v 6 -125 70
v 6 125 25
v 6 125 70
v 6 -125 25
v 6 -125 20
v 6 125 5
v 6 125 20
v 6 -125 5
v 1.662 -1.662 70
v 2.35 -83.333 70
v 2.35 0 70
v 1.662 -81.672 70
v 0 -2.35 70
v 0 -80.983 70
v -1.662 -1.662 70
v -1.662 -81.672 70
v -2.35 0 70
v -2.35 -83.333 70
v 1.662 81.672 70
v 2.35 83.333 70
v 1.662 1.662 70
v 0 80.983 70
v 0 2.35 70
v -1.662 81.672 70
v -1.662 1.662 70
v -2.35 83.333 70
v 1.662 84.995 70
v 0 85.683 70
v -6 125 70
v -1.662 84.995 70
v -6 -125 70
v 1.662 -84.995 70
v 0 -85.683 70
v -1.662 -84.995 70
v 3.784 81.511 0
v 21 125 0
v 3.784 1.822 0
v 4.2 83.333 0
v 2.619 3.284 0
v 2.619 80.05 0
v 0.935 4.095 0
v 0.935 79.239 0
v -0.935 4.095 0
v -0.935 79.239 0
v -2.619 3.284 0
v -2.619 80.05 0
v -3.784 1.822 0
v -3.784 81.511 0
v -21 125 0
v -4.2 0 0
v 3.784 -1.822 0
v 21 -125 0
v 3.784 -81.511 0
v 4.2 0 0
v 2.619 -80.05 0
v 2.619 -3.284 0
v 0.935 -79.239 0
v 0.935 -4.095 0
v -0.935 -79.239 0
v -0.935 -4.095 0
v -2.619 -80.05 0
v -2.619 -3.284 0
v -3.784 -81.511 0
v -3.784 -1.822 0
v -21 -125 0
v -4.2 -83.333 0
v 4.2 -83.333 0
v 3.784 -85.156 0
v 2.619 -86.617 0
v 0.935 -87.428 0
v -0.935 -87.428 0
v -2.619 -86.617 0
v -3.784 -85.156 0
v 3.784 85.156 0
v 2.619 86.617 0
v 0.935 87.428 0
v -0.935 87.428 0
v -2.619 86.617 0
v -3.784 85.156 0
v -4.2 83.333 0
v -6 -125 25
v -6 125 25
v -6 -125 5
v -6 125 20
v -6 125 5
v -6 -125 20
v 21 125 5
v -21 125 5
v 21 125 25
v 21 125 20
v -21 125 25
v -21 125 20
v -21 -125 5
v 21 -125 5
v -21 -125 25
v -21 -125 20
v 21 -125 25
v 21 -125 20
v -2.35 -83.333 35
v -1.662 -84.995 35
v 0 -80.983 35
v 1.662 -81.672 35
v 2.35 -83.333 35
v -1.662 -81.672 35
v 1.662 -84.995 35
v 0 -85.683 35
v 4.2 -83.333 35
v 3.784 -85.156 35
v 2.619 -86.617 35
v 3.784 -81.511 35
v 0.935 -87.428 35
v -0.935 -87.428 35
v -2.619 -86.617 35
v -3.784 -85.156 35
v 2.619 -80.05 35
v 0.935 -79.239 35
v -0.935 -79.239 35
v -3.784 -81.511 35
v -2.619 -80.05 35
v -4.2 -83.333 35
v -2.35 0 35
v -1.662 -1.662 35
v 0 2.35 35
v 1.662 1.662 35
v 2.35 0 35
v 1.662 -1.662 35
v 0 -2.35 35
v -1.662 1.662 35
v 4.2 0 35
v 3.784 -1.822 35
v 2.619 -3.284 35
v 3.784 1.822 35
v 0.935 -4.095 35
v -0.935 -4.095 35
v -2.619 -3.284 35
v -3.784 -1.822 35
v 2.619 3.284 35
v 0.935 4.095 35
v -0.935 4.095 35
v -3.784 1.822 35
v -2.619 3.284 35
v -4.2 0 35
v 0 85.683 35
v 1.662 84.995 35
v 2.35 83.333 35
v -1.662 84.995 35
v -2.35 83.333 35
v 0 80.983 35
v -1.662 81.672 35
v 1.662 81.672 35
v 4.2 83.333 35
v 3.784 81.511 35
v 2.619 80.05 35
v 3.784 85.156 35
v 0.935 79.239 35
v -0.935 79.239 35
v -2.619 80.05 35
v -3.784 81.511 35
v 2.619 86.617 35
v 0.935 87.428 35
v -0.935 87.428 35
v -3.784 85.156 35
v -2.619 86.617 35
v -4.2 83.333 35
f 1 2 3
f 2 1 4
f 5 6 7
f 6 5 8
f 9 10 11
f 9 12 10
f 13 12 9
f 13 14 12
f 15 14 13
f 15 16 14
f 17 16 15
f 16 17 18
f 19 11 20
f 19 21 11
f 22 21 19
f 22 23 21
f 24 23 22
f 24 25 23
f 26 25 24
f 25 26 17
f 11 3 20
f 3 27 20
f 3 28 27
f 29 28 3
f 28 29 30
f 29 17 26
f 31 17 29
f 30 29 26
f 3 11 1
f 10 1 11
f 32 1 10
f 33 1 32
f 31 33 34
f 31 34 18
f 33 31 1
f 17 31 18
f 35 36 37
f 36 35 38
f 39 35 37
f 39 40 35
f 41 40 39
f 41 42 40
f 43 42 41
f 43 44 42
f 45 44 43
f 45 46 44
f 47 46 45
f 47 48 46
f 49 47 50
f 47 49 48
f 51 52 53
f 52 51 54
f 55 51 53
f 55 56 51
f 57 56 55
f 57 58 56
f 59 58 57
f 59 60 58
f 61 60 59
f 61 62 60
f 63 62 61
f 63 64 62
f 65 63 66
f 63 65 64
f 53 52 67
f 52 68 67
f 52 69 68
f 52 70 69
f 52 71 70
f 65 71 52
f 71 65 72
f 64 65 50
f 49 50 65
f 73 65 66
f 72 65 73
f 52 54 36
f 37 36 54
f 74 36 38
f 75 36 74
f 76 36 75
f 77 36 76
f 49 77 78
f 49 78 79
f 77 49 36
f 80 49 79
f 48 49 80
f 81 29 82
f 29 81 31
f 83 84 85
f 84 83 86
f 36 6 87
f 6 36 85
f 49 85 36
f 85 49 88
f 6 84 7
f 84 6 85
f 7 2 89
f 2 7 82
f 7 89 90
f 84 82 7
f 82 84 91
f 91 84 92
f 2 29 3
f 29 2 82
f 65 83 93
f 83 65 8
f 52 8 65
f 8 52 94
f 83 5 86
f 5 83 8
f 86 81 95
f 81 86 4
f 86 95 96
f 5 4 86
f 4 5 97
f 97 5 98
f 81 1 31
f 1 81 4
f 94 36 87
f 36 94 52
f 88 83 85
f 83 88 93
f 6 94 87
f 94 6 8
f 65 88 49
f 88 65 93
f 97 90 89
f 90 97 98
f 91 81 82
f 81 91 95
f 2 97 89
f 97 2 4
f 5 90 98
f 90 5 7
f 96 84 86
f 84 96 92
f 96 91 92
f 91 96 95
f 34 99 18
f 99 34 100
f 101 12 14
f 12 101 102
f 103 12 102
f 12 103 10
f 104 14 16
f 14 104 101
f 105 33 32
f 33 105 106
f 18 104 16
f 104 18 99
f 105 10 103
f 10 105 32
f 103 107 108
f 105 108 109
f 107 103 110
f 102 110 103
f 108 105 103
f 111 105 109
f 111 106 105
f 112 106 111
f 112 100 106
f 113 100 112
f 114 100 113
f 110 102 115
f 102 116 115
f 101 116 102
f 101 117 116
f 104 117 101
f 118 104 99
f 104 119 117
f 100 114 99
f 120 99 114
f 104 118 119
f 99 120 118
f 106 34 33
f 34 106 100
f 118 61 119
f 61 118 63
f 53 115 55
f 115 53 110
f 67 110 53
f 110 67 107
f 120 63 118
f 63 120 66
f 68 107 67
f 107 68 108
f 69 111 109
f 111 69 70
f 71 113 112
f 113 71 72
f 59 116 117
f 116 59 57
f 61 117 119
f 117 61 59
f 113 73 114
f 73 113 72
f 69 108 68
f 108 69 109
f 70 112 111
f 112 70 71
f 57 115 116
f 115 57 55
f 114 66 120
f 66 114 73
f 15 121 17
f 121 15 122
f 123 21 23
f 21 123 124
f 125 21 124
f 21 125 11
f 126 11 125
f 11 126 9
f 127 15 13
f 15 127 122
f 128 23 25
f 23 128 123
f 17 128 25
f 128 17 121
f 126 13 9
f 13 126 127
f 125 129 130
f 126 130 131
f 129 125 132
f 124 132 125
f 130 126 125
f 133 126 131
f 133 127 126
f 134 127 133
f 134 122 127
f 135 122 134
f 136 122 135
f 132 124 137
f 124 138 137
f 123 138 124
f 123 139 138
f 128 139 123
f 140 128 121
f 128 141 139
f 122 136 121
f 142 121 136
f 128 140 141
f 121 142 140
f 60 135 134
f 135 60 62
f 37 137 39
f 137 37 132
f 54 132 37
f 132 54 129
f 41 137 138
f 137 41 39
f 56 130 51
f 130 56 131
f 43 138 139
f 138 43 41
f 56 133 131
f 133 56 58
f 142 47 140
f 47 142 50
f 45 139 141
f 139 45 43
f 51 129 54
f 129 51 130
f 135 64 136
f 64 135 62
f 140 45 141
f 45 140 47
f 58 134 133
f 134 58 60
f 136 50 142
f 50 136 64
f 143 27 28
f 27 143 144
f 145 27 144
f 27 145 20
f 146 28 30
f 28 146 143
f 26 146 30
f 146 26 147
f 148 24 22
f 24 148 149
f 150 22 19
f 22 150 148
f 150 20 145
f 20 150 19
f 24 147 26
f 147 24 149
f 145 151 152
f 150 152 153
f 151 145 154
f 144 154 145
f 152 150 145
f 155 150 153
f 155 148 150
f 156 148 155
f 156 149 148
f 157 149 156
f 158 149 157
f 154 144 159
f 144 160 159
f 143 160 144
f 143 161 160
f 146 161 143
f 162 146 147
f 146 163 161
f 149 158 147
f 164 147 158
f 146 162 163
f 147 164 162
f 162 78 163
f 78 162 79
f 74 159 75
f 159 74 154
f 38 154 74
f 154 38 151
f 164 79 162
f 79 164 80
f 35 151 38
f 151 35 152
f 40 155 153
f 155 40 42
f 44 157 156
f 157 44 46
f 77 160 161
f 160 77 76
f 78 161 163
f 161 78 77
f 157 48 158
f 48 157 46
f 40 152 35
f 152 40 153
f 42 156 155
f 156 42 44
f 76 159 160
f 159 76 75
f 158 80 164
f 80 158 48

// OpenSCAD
// A note on my use case:
// My desk has metal beams that are 40mm below the wood
// This means the mount for the drawer can only begin below that
// The space between is just spacing, and the screws need to factor this in too.

// Valid values:
// CENTER: The middle piece with rails on both sides
// LEFT: Only has rails on its right (mounts left)
// RIGHT: Only has rails on its left (mounts right)
// TEST: A small subsection designed for checking to save material printing
mode = "Center";

beam_depth = (mode == "Test") ? 12 : 250;
beam_width = 12;
beam_extra_height = 40; // compensates for desks with rails and struts
railing_width = 15;
railing_height = 20; // This one is the runner groove itself
rail_extrusion_height = 5;
beam_standard_height = (2 * rail_extrusion_height) + railing_height;
total_unit_height = beam_extra_height + beam_standard_height;

// The screws I am using: M8 (head) with 4.5mm shaft (0.2mm added to each)
// The screw length is 50mm from head to shaft, and I want it to dig 15mm into the desk
screw_head_radius = 8.4/2;
screw_shaft_radius = 4.7/2;
screw_length = 50;
screw_drill_depth = 15;


module main_beam() {
  translate([0,0,(beam_extra_height + beam_standard_height)/2])
  cube([beam_width, beam_depth, beam_extra_height + beam_standard_height], center=true);
  // The railing is on both sides
  total_railing_width = (mode == "Center" || mode == "Test") ? 
  ((2 * railing_width) + beam_width) : railing_width;
  offset_abs = beam_width/2 + railing_width/2;
  offset = (mode == "Left") ? offset_abs :  (mode == "Right") ? -offset_abs : 0; 
  // Lower railing
  translate([offset,0, rail_extrusion_height/2])
  cube([total_railing_width, beam_depth, rail_extrusion_height], center=true);
  // Upper railing
  translate([offset,0,rail_extrusion_height/2 + railing_height])
  cube([total_railing_width, beam_depth, rail_extrusion_height], center=true);
}

difference() {
  main_beam();
  // Determine how much of the screw will be recessed into the beam
  effective_screw_length = screw_length - screw_drill_depth;
  // Determine how empty shaft from bottom of unit to screw head
  screw_lead_height = total_unit_height - effective_screw_length;
  // Plot three screws
  start = (mode == "Test") ? 0 : -1;
  end = (mode == "Test") ? 0 : 1;
  for ( i = [start:1:end]) { 
    // The thinner shaft end of the screw
    translate([0,i * beam_depth/3,total_unit_height - effective_screw_length])
    cylinder(h=effective_screw_length, r=screw_shaft_radius, center=false);
    // The wider entry for the head of the screw
    translate([0,i * beam_depth/3,0])
    cylinder(h=screw_lead_height, r=screw_head_radius, center=false);
  }
}
